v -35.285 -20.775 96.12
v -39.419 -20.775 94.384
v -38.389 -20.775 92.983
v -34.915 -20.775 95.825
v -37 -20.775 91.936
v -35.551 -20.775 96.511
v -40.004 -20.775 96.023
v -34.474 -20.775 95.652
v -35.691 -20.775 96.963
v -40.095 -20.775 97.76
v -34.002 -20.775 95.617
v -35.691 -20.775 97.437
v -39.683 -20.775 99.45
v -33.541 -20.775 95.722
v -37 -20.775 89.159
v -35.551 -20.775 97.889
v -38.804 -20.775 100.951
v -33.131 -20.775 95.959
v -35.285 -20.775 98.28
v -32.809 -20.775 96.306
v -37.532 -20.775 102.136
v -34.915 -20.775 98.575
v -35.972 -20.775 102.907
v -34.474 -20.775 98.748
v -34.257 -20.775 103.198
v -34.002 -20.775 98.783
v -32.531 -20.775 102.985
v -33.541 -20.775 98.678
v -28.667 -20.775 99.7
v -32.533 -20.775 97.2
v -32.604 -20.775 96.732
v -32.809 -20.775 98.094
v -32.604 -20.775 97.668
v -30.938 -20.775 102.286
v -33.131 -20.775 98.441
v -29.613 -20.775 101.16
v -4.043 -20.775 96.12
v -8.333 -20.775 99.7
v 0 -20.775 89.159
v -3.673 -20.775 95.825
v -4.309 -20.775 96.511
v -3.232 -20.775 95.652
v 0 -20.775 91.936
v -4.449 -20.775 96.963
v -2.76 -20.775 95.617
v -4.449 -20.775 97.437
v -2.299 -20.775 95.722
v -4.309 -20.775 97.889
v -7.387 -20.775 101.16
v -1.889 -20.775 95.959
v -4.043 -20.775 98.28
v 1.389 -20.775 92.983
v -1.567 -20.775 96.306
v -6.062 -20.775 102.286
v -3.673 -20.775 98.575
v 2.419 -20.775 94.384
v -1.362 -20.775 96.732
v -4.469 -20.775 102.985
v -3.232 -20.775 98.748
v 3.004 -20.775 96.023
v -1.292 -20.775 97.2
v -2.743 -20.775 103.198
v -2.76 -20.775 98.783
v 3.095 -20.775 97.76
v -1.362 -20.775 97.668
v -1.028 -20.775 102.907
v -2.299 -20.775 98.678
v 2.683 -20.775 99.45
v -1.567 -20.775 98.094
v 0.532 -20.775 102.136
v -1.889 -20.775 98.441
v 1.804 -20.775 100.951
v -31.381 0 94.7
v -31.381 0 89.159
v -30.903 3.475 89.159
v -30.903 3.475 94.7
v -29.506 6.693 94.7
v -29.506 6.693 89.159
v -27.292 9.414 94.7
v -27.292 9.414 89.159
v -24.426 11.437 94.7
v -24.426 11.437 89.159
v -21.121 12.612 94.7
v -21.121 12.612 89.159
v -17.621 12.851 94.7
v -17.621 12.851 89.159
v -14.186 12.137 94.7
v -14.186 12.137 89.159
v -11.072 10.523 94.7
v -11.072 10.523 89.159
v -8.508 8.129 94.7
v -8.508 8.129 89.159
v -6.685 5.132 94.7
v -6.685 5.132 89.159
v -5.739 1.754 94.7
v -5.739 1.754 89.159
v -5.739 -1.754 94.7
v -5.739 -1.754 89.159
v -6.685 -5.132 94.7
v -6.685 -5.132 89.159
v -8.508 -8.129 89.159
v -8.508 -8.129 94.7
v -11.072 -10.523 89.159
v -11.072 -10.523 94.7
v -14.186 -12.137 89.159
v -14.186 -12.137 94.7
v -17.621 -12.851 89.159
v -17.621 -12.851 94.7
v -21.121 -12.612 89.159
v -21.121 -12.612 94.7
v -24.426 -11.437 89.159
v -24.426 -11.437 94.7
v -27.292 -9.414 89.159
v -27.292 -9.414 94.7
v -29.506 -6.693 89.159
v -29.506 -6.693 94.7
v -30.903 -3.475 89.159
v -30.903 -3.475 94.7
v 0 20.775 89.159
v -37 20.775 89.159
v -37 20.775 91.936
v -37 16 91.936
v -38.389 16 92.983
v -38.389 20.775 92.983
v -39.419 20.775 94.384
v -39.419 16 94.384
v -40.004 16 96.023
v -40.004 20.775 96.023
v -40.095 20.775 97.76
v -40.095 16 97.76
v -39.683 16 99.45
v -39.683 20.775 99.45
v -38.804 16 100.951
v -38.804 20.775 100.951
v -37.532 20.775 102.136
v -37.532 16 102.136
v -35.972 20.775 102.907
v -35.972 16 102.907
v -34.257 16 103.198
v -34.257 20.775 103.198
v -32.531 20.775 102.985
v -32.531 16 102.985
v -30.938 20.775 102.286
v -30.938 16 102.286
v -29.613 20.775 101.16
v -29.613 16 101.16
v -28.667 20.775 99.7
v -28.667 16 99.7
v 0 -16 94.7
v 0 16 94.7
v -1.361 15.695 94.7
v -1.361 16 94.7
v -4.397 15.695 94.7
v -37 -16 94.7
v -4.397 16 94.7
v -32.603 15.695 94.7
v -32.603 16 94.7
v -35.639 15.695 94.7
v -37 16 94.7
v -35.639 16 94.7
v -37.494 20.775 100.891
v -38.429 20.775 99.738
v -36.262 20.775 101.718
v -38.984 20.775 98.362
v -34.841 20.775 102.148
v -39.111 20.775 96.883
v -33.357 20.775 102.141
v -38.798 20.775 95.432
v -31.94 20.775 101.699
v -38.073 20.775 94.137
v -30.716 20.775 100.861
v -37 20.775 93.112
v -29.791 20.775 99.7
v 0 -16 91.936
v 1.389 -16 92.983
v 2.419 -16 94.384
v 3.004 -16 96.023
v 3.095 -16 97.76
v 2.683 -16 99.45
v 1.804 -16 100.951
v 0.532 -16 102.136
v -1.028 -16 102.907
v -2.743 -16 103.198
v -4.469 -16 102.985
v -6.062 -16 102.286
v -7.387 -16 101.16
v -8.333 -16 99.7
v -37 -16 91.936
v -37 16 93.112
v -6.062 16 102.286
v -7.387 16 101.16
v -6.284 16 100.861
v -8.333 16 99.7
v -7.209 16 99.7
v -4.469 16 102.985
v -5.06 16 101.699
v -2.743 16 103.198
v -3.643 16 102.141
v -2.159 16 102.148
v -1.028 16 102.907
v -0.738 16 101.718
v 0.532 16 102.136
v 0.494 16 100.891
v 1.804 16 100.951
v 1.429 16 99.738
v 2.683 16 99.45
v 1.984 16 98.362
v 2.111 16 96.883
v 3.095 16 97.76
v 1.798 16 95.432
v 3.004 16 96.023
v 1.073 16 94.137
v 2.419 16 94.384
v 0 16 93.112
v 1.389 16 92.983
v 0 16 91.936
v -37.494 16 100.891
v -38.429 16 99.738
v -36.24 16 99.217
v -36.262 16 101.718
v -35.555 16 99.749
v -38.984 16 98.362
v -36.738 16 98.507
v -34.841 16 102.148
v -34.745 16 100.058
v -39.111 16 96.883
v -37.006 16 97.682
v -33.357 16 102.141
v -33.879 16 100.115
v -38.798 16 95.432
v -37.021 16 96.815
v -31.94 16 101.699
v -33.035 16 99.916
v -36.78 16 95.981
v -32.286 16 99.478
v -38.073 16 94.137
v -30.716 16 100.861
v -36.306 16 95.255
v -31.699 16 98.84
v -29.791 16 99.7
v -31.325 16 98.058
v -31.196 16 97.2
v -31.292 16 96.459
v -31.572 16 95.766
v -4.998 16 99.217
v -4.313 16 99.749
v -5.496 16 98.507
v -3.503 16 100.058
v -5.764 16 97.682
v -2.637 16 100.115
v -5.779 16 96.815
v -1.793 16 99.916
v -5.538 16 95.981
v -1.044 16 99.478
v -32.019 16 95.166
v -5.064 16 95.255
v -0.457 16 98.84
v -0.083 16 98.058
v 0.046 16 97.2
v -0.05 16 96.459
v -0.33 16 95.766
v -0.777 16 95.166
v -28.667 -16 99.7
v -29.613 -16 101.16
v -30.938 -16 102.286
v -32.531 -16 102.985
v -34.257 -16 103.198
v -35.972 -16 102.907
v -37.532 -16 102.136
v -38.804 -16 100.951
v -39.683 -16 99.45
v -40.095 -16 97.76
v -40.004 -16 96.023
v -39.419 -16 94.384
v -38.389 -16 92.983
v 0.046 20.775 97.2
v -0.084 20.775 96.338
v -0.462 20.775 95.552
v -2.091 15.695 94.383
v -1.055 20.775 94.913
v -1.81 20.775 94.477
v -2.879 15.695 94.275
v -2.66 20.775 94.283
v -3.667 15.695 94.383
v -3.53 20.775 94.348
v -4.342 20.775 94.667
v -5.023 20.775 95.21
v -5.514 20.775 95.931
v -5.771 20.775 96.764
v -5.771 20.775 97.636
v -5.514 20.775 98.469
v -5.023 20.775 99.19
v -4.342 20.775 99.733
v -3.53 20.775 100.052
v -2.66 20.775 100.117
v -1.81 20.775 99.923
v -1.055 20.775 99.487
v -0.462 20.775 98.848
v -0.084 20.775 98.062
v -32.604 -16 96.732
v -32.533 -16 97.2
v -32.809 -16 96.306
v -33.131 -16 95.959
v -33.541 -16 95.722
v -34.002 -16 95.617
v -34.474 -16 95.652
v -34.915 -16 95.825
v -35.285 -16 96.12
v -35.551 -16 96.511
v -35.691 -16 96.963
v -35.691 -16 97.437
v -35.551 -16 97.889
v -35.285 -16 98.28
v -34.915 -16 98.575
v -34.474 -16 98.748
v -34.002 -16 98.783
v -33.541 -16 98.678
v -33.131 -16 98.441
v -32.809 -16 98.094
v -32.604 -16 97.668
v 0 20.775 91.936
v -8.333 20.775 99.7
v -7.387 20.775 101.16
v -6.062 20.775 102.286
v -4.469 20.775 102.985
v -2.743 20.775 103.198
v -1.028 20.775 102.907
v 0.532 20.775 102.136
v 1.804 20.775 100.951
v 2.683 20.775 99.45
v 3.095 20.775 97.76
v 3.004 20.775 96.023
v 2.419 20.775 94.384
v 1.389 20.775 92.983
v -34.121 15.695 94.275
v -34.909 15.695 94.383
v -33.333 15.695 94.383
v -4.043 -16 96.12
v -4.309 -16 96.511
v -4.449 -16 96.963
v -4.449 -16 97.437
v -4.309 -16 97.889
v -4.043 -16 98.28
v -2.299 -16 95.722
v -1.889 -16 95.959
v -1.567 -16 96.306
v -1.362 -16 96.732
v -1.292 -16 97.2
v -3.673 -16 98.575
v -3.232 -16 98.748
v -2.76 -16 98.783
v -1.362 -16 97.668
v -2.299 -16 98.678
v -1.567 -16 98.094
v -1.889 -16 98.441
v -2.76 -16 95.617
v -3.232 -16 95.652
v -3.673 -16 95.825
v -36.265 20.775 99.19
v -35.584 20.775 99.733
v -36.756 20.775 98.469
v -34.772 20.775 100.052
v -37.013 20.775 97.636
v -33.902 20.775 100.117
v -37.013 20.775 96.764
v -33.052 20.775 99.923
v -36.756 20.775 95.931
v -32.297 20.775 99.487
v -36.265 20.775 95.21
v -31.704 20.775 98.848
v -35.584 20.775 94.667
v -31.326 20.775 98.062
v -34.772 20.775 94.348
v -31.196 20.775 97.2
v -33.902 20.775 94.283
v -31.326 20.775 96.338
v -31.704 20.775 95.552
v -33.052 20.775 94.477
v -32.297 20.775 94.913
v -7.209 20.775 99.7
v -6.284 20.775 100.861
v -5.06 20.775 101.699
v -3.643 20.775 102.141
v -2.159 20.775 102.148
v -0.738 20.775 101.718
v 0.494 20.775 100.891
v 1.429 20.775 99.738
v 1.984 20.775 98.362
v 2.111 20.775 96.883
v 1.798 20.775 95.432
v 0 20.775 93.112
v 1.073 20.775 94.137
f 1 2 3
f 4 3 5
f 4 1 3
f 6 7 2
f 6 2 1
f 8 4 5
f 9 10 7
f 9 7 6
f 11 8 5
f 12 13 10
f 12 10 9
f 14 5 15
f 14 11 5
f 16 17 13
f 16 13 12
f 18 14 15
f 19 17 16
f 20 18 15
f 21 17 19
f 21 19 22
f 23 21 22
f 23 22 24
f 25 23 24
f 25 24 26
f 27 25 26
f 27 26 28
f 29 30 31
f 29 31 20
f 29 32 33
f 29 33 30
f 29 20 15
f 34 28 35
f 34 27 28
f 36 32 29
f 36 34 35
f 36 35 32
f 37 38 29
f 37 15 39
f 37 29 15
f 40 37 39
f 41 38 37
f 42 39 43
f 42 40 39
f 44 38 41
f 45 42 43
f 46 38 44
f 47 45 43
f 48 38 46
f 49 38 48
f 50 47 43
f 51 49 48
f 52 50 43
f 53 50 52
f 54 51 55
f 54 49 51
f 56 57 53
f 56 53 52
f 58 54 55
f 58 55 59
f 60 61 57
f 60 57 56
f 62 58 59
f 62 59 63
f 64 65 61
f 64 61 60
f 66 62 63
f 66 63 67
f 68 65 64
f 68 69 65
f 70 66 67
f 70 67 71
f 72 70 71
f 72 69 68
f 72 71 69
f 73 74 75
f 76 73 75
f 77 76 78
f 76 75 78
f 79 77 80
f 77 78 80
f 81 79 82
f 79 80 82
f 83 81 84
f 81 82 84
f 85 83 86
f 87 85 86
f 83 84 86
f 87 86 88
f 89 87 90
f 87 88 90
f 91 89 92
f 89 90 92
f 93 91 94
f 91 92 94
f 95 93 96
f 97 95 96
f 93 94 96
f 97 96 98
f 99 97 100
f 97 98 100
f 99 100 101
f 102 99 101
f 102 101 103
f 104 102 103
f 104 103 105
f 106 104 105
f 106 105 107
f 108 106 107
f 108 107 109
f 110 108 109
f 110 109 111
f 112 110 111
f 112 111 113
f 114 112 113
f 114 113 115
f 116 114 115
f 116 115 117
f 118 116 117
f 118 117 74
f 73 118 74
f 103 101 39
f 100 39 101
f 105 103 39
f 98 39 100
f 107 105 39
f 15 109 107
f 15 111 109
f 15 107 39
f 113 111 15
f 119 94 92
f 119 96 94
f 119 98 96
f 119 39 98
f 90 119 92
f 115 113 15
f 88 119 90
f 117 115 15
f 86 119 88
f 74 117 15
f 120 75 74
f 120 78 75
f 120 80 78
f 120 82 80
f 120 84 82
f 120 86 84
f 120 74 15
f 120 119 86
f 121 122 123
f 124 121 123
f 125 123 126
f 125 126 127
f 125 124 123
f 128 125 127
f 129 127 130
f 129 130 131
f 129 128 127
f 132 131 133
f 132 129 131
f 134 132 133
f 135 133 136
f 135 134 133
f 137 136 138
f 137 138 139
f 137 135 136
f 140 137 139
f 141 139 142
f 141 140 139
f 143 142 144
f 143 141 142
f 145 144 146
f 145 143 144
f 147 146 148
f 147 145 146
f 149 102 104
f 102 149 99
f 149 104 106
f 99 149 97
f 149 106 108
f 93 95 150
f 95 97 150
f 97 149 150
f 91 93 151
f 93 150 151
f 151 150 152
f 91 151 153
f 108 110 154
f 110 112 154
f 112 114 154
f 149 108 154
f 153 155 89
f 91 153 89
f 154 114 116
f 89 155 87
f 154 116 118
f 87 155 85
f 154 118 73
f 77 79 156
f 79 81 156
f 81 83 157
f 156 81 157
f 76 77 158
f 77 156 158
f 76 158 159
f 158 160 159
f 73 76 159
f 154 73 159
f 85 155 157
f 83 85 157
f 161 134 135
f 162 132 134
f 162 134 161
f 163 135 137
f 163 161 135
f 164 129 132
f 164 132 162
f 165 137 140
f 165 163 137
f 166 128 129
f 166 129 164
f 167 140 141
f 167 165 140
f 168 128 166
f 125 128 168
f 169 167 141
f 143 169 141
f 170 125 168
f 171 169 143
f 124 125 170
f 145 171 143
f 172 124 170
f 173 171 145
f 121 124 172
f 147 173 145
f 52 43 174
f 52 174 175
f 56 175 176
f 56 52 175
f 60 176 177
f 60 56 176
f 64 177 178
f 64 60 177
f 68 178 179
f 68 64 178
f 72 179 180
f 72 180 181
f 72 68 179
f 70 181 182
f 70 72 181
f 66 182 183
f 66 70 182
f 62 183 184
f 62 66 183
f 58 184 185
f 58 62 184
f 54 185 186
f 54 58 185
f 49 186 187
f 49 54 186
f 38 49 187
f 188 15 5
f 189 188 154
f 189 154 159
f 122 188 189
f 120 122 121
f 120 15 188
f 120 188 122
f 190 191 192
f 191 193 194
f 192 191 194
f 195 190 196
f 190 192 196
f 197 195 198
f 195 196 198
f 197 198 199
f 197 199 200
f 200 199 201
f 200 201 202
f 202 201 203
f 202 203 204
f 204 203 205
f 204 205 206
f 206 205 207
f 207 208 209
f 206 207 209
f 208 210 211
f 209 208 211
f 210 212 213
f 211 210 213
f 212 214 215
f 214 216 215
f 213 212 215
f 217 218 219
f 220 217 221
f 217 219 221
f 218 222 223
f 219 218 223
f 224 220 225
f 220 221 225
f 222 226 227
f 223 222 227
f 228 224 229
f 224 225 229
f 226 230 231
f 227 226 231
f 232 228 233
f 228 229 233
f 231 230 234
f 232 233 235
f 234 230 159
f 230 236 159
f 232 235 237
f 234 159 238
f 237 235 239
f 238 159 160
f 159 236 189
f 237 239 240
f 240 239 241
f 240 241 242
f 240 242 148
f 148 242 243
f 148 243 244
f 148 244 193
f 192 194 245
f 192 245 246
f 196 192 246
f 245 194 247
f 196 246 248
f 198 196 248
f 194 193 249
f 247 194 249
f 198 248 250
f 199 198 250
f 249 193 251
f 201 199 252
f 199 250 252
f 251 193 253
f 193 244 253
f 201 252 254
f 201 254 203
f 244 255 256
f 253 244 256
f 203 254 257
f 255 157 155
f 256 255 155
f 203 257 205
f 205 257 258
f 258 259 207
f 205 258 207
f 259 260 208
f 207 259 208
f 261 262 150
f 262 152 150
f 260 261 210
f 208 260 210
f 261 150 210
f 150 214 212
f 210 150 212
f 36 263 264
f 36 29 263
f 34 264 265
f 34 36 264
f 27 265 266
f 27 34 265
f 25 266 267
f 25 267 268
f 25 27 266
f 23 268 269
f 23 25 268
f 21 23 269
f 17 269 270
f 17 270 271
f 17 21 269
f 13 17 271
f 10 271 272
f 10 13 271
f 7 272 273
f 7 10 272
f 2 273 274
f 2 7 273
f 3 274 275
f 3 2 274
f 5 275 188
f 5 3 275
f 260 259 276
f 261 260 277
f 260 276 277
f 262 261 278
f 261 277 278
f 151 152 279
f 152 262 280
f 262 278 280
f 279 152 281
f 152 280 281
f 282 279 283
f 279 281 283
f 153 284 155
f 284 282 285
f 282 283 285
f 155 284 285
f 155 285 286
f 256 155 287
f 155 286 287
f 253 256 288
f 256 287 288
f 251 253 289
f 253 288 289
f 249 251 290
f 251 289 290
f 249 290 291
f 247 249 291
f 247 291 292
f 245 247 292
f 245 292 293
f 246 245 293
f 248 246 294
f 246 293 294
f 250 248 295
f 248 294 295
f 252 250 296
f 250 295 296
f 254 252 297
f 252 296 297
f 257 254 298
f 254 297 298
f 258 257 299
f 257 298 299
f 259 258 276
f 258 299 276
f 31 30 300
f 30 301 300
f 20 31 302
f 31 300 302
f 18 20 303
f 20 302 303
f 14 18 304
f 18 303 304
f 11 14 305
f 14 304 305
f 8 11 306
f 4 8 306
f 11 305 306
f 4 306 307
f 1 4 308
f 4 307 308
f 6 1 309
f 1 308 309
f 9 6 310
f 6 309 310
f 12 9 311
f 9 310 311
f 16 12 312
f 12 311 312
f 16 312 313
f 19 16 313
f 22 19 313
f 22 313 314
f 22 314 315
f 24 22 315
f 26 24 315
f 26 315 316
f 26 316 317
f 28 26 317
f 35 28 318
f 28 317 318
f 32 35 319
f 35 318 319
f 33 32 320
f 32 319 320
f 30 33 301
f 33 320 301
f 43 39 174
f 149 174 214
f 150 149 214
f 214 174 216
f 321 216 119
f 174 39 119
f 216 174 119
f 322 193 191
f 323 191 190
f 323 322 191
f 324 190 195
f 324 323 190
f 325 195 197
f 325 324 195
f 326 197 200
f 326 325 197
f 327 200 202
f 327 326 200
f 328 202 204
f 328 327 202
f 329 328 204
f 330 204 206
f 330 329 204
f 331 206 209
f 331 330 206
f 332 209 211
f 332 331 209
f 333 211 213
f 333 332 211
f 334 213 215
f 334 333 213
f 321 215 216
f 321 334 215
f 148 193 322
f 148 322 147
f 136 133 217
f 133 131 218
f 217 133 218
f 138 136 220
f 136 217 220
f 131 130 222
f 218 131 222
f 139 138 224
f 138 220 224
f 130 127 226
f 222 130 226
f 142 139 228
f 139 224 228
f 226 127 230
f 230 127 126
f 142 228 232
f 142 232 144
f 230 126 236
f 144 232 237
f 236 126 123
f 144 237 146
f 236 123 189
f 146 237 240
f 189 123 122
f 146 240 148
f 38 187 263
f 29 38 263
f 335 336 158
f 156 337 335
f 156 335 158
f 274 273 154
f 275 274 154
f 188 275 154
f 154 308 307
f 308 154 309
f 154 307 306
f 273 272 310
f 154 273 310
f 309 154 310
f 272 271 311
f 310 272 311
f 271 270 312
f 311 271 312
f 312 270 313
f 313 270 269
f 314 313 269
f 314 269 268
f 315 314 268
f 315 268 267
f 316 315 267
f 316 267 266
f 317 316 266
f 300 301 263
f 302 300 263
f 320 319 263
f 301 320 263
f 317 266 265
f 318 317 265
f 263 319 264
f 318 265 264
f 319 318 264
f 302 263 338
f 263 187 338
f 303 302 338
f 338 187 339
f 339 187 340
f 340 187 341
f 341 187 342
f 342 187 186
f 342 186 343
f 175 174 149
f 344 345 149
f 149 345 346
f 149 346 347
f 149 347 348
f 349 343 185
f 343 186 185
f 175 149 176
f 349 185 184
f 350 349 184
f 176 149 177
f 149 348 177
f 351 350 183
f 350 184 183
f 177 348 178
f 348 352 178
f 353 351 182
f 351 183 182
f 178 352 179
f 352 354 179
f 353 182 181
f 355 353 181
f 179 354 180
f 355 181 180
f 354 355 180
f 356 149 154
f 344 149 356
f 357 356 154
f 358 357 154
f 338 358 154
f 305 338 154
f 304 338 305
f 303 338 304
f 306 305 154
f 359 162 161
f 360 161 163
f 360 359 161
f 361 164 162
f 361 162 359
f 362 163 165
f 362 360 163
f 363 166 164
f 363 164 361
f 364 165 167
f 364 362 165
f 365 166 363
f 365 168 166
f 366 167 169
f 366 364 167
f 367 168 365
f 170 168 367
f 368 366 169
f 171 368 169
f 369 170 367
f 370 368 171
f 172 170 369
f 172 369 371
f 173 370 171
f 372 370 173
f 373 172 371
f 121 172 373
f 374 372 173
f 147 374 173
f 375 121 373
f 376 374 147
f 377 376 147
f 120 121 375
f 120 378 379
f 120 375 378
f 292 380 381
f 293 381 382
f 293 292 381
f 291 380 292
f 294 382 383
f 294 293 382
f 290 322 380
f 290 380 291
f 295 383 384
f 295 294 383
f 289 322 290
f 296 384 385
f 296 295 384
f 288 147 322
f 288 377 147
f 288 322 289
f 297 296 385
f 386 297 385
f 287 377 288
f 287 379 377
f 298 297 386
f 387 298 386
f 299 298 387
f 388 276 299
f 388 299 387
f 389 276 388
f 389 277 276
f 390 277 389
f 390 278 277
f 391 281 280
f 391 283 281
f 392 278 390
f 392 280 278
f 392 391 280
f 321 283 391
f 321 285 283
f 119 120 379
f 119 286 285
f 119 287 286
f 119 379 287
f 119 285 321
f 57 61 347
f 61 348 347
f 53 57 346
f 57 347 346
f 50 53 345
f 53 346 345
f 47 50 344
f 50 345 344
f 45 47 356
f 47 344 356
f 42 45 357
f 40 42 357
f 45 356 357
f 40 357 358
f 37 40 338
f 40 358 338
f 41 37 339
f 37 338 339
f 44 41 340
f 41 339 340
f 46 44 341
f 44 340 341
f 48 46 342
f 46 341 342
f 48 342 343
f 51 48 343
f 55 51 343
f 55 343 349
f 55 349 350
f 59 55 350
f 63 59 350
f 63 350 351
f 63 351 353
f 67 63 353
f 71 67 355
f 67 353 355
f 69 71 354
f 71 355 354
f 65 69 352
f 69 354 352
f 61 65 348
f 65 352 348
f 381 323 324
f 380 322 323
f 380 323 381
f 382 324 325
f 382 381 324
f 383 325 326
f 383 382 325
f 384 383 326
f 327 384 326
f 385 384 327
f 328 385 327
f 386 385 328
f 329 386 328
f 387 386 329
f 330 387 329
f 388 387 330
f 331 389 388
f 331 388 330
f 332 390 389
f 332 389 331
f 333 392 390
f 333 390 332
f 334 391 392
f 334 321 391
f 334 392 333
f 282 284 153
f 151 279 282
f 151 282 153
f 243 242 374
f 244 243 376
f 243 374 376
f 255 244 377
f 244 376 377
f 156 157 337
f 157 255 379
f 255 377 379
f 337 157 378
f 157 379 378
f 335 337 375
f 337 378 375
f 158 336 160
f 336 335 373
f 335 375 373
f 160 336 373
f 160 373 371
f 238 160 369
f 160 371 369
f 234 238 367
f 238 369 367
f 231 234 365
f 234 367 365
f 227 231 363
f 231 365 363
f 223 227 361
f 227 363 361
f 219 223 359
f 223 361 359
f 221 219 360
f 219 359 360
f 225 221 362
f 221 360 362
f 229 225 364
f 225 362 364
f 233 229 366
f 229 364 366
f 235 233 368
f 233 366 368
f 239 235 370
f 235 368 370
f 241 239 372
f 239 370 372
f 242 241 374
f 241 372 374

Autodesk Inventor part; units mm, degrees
ref_plane "YZ Plane" through (0, 0, 0) normal (1, 0, 0) x (0, 1, 0)
ref_plane "XZ Plane" through (0, 0, 0) normal (0, 1, 0) x (-1, 0, 0)
ref_plane "XY Plane" through (0, 0, 0) normal (0, 0, 1) x (1, 0, 0)
sketch "Sketch2" plane through (0, 0, 0) normal (1, 0, 0) x (0, 1, 0)
  circle A0 centre (0, 0) radius 12.881
  line L0 (-16, -18.5) -> (16, -18.5)
  line L1 (16, -18.5) -> (16, 18.5)
  line L2 (16, 18.5) -> (-16, 18.5)
  line L3 (-16, 18.5) -> (-16, -18.5)
  line L4 (-16, -18.5) -> (16, 18.5) construction
  line L5 (16, -18.5) -> (-16, 18.5) construction
  dimension "d9" = 25.762
  dimension "d10" = 32
  dimension "d11" = 37
extrude "Extrusion2" add sketch "Sketch2" along normal blind 76.2
sketch "Sketch3" plane through (0, -16, -18.5) normal (0, 0, -1) x (-1, 0, 0)
  line L0 (0, 0) -> (0, 32) projected
  circle A0 centre (18.5, 16) radius 12.881
  line L1 (0, 32) -> (0, 0)
  line L2 (0, 0) -> (37, 0)
  line L3 (37, 0) -> (37, 32)
  line L4 (37, 32) -> (0, 32)
  line L5 (0, 32) -> (37, 0) construction
  line L6 (0, 0) -> (37, 32) construction
  point P0 (0, 16)
  dimension "d14" = 25.762
  dimension "d15" = 32
  dimension "d16" = 37
extrude "Extrusion3" add sketch "Sketch3" against normal blind 113.2
sketch "Sketch4" plane through (76.2, -16, -18.5) normal (0, 0, -1) x (-1, 0, 0)
  circle A0 centre (94.7, 16) radius 12.881 projected
  point P0 (76.2, 16)
extrude "Extrusion4" add sketch "Sketch4" against normal blind 37
sketch "Sketch5" plane through (76.2, 16, 18.5) normal (0, 1, 0) x (1, 0, 0)
  line L0 (-113.2, 37) -> (0, 37) projected
  line L1 (-113.2, 37) -> (-113.2, -76.2) projected
  line L2 (-113.2, 37) -> (-100.1185, 50.0815)
  line L3 (-113.2, 37) -> (-94.7, 37) construction
  line L4 (-113.2, 37) -> (-126.2815, 23.9185)
  line L5 (-113.2, 37) -> (-94.7, 37) construction
  line L6 (-100.1185, 50.0815) -> (-154.0001, 103.963)
  line L7 (-126.2815, 23.9185) -> (-180.163, 77.8001)
  line L8 (-126.2815, 23.9185) -> (-50.0815, 23.9185) construction
  line L9 (-154.0001, 103.963) -> (-180.163, 77.8001)
  line L10 (-100.1185, 50.0815) -> (-87.037, 37)
  line L11 (-126.2815, 23.9185) -> (-113.2, 10.837)
  point P0 (-76.2, 18.5)
  dimension "d21" = 18.5
  dimension "d22" = 45
  dimension "d23" = 18.5
  dimension "d24" = 135
  dimension "d25" = 76.2
  dimension "d26" = 76.2
  dimension "d27" = 135
extrude "Extrusion5" add sketch "Sketch5" against normal blind 32
sketch "Sketch7" plane through (-77.8001, -16, -85.463) normal (-0.7071068, 0, -0.7071068) x (-0.7071068, 0, 0.7071068)
  line L0 (36.4256, 0.4968) -> (36.4256, 31.5032)
  line L1 (36.4256, 31.5032) -> (0.5744, 31.5032)
  line L2 (0.5744, 31.5032) -> (0.5744, 0.4968)
  line L3 (0.5744, 0.4968) -> (36.4256, 0.4968)
  circle A0 centre (18.5, 16) radius 12.881
  point P0 (5.4185, 16)
  point P1 (36.4256, 16)
  dimension "d131" = 25.762
extrude "Extrusion6" cut sketch "Sketch7" against normal blind 101.6 contours A0
sketch "Sketch8" plane through (76.2, 16, 18.5) normal (0, 1, 0) x (1, 0, 0)
  line L0 (-76.2, 0) -> (0, 0) projected
  line L1 (-87.037, 37) -> (0, 37) projected
  line L2 (-87.037, 37) -> (-154.0001, 103.963) projected
  line L3 (-180.163, 77.8001) -> (-113.2, 10.837) projected
  line L4 (-113.2, 10.837) -> (-113.2, -76.2) projected
  line L5 (-76.2, 0) -> (-76.2, -76.2) projected
  line L6 (0, 37) -> (5, 37)
  line L7 (5, 37) -> (5, 0)
  line L8 (5, 0) -> (0, 0)
  line L9 (0, 0) -> (0, 37)
  line L10 (-113.2, -76.2) -> (-76.2, -76.2)
  line L11 (-76.2, -76.2) -> (-76.2, -81.2)
  line L12 (-76.2, -81.2) -> (-113.2, -81.2)
  line L13 (-113.2, -81.2) -> (-113.2, -76.2)
  line L14 (-180.163, 77.8001) -> (-183.6985, 81.3356)
  line L15 (-183.6985, 81.3356) -> (-157.5356, 107.4985)
  line L16 (-157.5356, 107.4985) -> (-154.0001, 103.963)
  point P0 (-76.2, 18.5)
  dimension "d32" = 5
  dimension "d33" = 5
  dimension "d34" = 5
  dimension "d35" = 90
extrude "Extrusion7" add sketch "Sketch8" along normal blind 4.7752
sketch "Sketch9" plane through (76.2, -16, -18.5) normal (0, -1, 0) x (1, 0, 0)
  line L0 (-87.037, 0) -> (0, 0) projected
  line L1 (-76.2, 37) -> (0, 37) projected
  line L2 (-76.2, 37) -> (-76.2, 113.2) projected
  line L3 (-113.2, 26.163) -> (-113.2, 113.2) projected
  line L4 (-113.2, 26.163) -> (-180.163, -40.8001) projected
  line L5 (-154.0001, -66.963) -> (-87.037, 0) projected
  line L6 (-76.2, 118.2) -> (-76.2, 37) projected
  line L7 (-113.2, 113.2) -> (-76.2, 113.2)
  line L8 (-76.2, 113.2) -> (-76.2, 118.2)
  line L9 (-76.2, 118.2) -> (-113.2, 118.2)
  line L10 (-113.2, 118.2) -> (-113.2, 113.2)
  line L11 (-76.2, 37) -> (5, 37) projected
  line L12 (0, 0) -> (5, 0)
  line L13 (5, 0) -> (5, 37)
  line L14 (5, 37) -> (0, 37)
  line L15 (0, 37) -> (0, 0)
  line L16 (-183.6985, -44.3356) -> (-113.2, 26.163) projected
  line L17 (-180.163, -40.8001) -> (-183.6985, -44.3356)
  line L18 (-183.6985, -44.3356) -> (-157.5356, -70.4985)
  line L19 (-157.5356, -70.4985) -> (-154.0001, -66.963)
  point P0 (-76.2, 18.5)
extrude "Extrusion8" add sketch "Sketch9" along normal blind 4.7752
sketch "Sketch10" plane through (76.2, 20.7752, 18.5) normal (0, 1, 0) x (1, 0, 0)
  circle A0 centre (2.5, 34.4385) radius 1.5875
  circle A1 centre (2.5, 2.5615) radius 1.5875
  line L0 (0, 37.0615) -> (0, 0.0615)
  line L1 (0, 0.0615) -> (5, 0.0615)
  line L2 (5, 37.0615) -> (5, 0.0615)
  line L3 (0, 37.0615) -> (5, 37.0615)
  line L4 (5, 0) -> (5, 37) projected
  line L5 (0, 18.5) -> (5, 18.5)
  point P0 (-76.2, 18.5)
  dimension "d143" = 15.9385
  dimension "d144" = 2.5
  dimension "d145" = 2.5
  dimension "d146" = 15.9385
extrude "Extrusion9" cut sketch "Sketch10" against normal blind 279.4 contours A0 | A1
sketch "Sketch11" plane through (76.2, 20.7752, 18.5) normal (0, 1, 0) x (1, 0, 0)
  circle A0 centre (-79.079, -78.7) radius 1.5875
  circle A1 centre (-110.321, -78.7) radius 1.5875
  line L0 (-76.579, -76.2) -> (-113.579, -76.2)
  line L1 (-113.579, -76.2) -> (-113.579, -81.2)
  line L2 (-76.579, -81.2) -> (-113.579, -81.2)
  line L3 (-76.579, -76.2) -> (-76.579, -81.2)
  circle A2 centre (-157.6226, 103.876) radius 1.778
  circle A3 centre (-180.163, 81.3356) radius 1.778
  line L4 (-157.5791, 107.4551) -> (-183.742, 81.2921)
  line L5 (-183.742, 81.2921) -> (-180.2065, 77.7566)
  line L6 (-154.0435, 103.9195) -> (-180.2065, 77.7566)
  line L7 (-157.5791, 107.4551) -> (-154.0435, 103.9195)
  line L8 (-157.5356, 107.4985) -> (-183.6985, 81.3356) projected
  line L9 (-170.6606, 94.3736) -> (-167.125, 90.838)
  line L10 (-113.2, -81.2) -> (-76.2, -81.2) projected
  line L11 (-94.7, -76.2) -> (-94.7, -81.2)
  point P0 (-76.2, 18.5)
  dimension "d147" = 2.5
  dimension "d148" = 2.5
  dimension "d149" = 15.9385
  dimension "d150" = 15.9385
  dimension "d151" = 2.5
  dimension "d152" = 2.5
  dimension "d153" = 15.621
  dimension "d154" = 15.621
  dimension "d175" = 3.556
  dimension "d176" = 3.556
extrude "Extrusion10" cut sketch "Sketch11" against normal blind 279.4 contours A0 | A1 | A2 | A3
fillet "Fillet1" radius 3.175 3 edges at (-10.837, 0, -18.5) (0, 0, 18.5) (-37, 0, 7.663)
sketch "Sketch13" plane through (76.2, 20.7752, 18.5) normal (0, 1, 0) x (1, 0, 0)
  line L0 (-157.5356, 107.4985) -> (-183.6985, 81.3356) projected
  line L1 (-113.2, -81.2) -> (-76.2, -81.2) projected
  line L2 (5, 0) -> (5, 37) projected
  line L3 (5, 37) -> (5, 0) projected
  line L4 (5, 18.5) -> (-120.863, 18.5)
  line L5 (-114.1299, 11.767) -> (-183.6985, 81.3356) projected
  line L6 (-76.2, -81.2) -> (-113.2, -81.2) projected
  line L7 (-94.7, -81.2) -> (-95.2395, 19.0395)
  line L8 (-104.3477, 9.9312) -> (-86.1312, 28.1477) projected
  line L9 (-95.2395, 19.0395) -> (-170.6171, 94.4171)
  line L10 (-183.6985, 81.3356) -> (-157.5356, 107.4985) projected
  circle A0 centre (-14.05, 18.5) radius 6.35
  circle A1 centre (-39.45, 18.5) radius 6.35
  circle A2 centre (-64.85, 18.5) radius 6.35
  circle A3 centre (-90.25, 18.5) radius 6.35
  circle A4 centre (-94.8025, -62.15) radius 6.35
  circle A5 centre (-94.9392, -36.7504) radius 6.35
  circle A6 centre (-95.0759, -11.3507) radius 6.35
  circle A7 centre (-95.2126, 14.0489) radius 6.35
  circle A8 centre (-157.1467, 80.9467) radius 6.35
  circle A9 centre (-139.1862, 62.9862) radius 6.35
  circle A10 centre (-121.2257, 45.0257) radius 6.35
  circle A11 centre (-103.2651, 27.0651) radius 6.35
  point P0 (-76.2, 18.5)
  point P1 (-95.1101, -5.0008)
  point P2 (-95.0418, -17.7006)
  point P3 (-94.9734, -30.4005)
  point P4 (-94.9051, -43.1003)
  dimension "d60" = 12.7
  dimension "d61" = 19.05
  dimension "d64" = 25.4
  dimension "d69" = 12.7
  dimension "d70" = 19.05
  dimension "d73" = 25.4
  dimension "d78" = 12.7
  dimension "d79" = 19.05
  dimension "d82" = 25.4
extrude "Extrusion12" cut sketch "Sketch13" against normal blind 127 contours A8 L9 | L9 A8 | A9 L9 | L9 A9 | A11 L9 | L9 A11 | A10 L9 | L9 A10 | A0 L4 | L4 A0 | A1 L4 | L4 A1 | A2 L4 | L4 A2 | A4 L7 | L7 A4 | A5 L7 | L7 A5 | A6 L7 | L7 A6
sketch "Sketch14" plane through (81.2, 16, -18.5) normal (0, 0, -1) x (-1, 0, 0)
  line L0 (0, 4.7752) -> (90.7219, 4.7752) projected
  line L1 (0, 0) -> (0, 4.7752) projected
  circle A0 centre (19.05, -16) radius 6.35
  circle A1 centre (44.45, -16) radius 6.35
  circle A2 centre (69.85, -16) radius 6.35
  point P0 (81.2, -16)
  dimension "d89" = 12.7
  dimension "d91" = 19.05
  dimension "d94" = 25.4
extrude "Extrusion13" cut sketch "Sketch14" against normal blind 50.8
sketch "Sketch15" plane through (-37, 16, 94.7) normal (-1, 0, 0) x (0, 0, 1)
  line L0 (5, 0) -> (5, 4.7752) projected
  line L1 (-85.7219, 4.7752) -> (5, 4.7752) projected
  circle A0 centre (-14.05, -16) radius 6.35
  circle A1 centre (-39.45, -16) radius 6.35
  circle A2 centre (-64.85, -16) radius 6.35
  point P0 (-94.7, -16)
  dimension "d101" = 12.7
  dimension "d102" = 19.05
  dimension "d105" = 25.4
extrude "Extrusion14" cut sketch "Sketch15" against normal blind 50.8
sketch "Sketch16" plane through (-107.4985, 16, -62.8356) normal (-0.7071068, 0, 0.7071068) x (0.7071068, 0, 0.7071068)
  line L0 (0, 4.7752) -> (98.3849, 4.7752) projected
  line L1 (0, 0) -> (0, 4.7752) projected
  circle A0 centre (19.05, -16) radius 6.35
  circle A1 centre (44.45, -16) radius 6.35
  circle A2 centre (69.85, -16) radius 6.35
  point P0 (120.4444, -16)
  dimension "d112" = 12.7
  dimension "d113" = 19.05
  dimension "d116" = 25.4
extrude "Extrusion15" cut sketch "Sketch16" against normal blind 101.6
sketch "Sketch19" plane through (76.2, 20.7752, 18.5) normal (0, 1, 0) x (1, 0, 0)
  circle A0 centre (-157.6226, 103.876) radius 1.778 projected
  circle A1 centre (-79.079, -78.7) radius 1.5875 projected
  circle A2 centre (-180.163, 81.3356) radius 1.778 projected
  circle A3 centre (-110.321, -78.7) radius 1.5875 projected
  circle A4 centre (2.5, 2.5615) radius 1.5875 projected
  circle A5 centre (2.5, 34.4385) radius 1.5875 projected
  line L0 (-87.967, 37.9299) -> (-157.5356, 107.4985) projected
  line L1 (-157.5356, 107.4985) -> (-183.6985, 81.3356) projected
  line L2 (-183.6985, 81.3356) -> (-114.1299, 11.767) projected
  line L3 (-113.2, 9.5219) -> (-113.2, -81.2) projected
  line L4 (-113.2, -81.2) -> (-76.2, -81.2) projected
  line L5 (-76.2, -81.2) -> (-76.2, -3.175) projected
  line L6 (-73.025, 0) -> (5, 0) projected
  line L7 (5, 0) -> (5, 37) projected
  line L8 (5, 37) -> (-85.7219, 37) projected
  circle A6 centre (2.5, 2.5615) radius 5
  circle A7 centre (2.5, 34.4385) radius 5
  circle A8 centre (-110.321, -78.7) radius 5
  circle A9 centre (-79.079, -78.7) radius 5
  circle A10 centre (-180.163, 81.3356) radius 5
  circle A11 centre (-157.6226, 103.876) radius 5
  point P0 (-76.2, 18.5)
  point P1 (-76.2, -74.612)
  point P2 (-83.4091, -81.2)
  point P3 (-113.2, -74.612)
  point P4 (-105.9909, -81.2)
  point P5 (-178.8689, 86.1652)
  point P6 (-178.8689, 76.506)
  point P7 (-152.7579, 102.7208)
  point P8 (-162.4522, 102.5819)
  point P9 (5, 6.8916)
  point P10 (-1.794, 0)
  point P11 (-1.794, 37)
  point P12 (5, 30.1084)
  dimension "d132" = 10
  dimension "d133" = 10
  dimension "d134" = 10
  dimension "d135" = 10
  dimension "d136" = 10
  dimension "d137" = 10
extrude "Extrusion17" add sketch "Sketch19" against normal blind 4.7752 contours L0 L1 A11 | L1 L2 A10 | L3 L4 A8 | L4 L5 A9 | L6 L7 A6 | L7 L8 A7 picked at (-160.8698, 104.621) picked at (-180.881, 84.6119) picked at (-108.6315, -81.5172) picked at (-80.7689, -81.5168) picked at (0.7108, -0.3118) picked at (0.7108, 37.3118)
sketch "Sketch20" plane through (76.2, -20.7752, -18.5) normal (0, -1, 0) x (1, 0, 0)
  circle A0 centre (-157.6226, -66.876) radius 1.778 projected
  circle A1 centre (-180.163, -44.3356) radius 1.778 projected
  circle A2 centre (2.5, 34.4385) radius 1.5875 projected
  circle A3 centre (2.5, 2.5615) radius 1.5875 projected
  line L0 (-157.5356, -70.4985) -> (-87.967, -0.9299) projected
  line L1 (-85.7219, 0) -> (5, 0) projected
  line L2 (5, 0) -> (5, 37) projected
  line L3 (5, 37) -> (-73.025, 37) projected
  line L4 (-76.2, 40.175) -> (-76.2, 118.2) projected
  line L5 (-76.2, 118.2) -> (-113.2, 118.2) projected
  line L6 (-113.2, 118.2) -> (-113.2, 27.4781) projected
  line L7 (-114.1299, 25.233) -> (-183.6985, -44.3356) projected
  line L8 (-183.6985, -44.3356) -> (-157.5356, -70.4985) projected
  circle A4 centre (-157.6226, -66.876) radius 5
  circle A5 centre (-180.163, -44.3356) radius 5
  circle A6 centre (-110.321, 115.7) radius 1.5875 projected
  circle A7 centre (-110.321, 115.7) radius 6
  circle A8 centre (-79.079, 115.7) radius 1.5875 projected
  circle A9 centre (-79.079, 115.7) radius 6
  circle A10 centre (2.5, 34.4385) radius 5
  circle A11 centre (2.5, 2.5615) radius 5
  point P0 (-76.2, 18.5)
  point P1 (5, 6.8916)
  point P2 (-1.794, 0)
  point P3 (-1.794, 37)
  point P4 (5, 30.1084)
  point P5 (-84.5334, 118.2)
  point P6 (-76.2, 110.4358)
  point P7 (-104.8666, 118.2)
  point P8 (-113.2, 110.4358)
  point P9 (-162.4522, -65.5819)
  point P10 (-152.7579, -65.7208)
  point P11 (-178.8689, -39.506)
  point P12 (-178.8689, -49.1652)
  dimension "d173" = 12
  dimension "d174" = 12
extrude "Extrusion18" add sketch "Sketch20" against normal blind 4.7752 contours L0 A4 L8 | L1 L2 A11 | L2 L3 A10 | L4 L5 A9 | L5 L6 A7 | L7 L8 A5 picked at (-160.8698, -67.621) picked at (0.7108, -0.3118) picked at (0.7108, 37.3118) picked at (-81.4972, 118.6185) picked at (-107.8901, 118.6026) picked at (-180.881, -47.6119)
sketch "Sketch21" plane through (76.2, 20.7752, 18.5) normal (0, 1, 0) x (1, 0, 0)
  circle A0 centre (-79.079, -78.7) radius 1.5875 projected
  circle A1 centre (-110.321, -78.7) radius 1.5875 projected
  circle A2 centre (2.5, 2.5615) radius 1.5875 projected
  circle A3 centre (2.5, 34.4385) radius 1.5875 projected
  arc A4 (-152.7579, 102.7208) -> (-162.4522, 102.5819) centre (-157.6226, 103.876) ccw projected
  arc A5 (-178.8689, 86.1652) -> (-178.8689, 76.506) centre (-180.163, 81.3356) ccw projected
  arc A6 (-113.2, -74.612) -> (-105.9909, -81.2) centre (-110.321, -78.7) ccw projected
  circle A7 centre (-110.321, -78.7) radius 2.8
  circle A8 centre (-79.079, -78.7) radius 1.5875 projected
  circle A9 centre (-79.079, -78.7) radius 2.8
  circle A10 centre (2.5, 34.4385) radius 1.5875 projected
  circle A11 centre (2.5, 34.4385) radius 2.8
  circle A12 centre (2.5, 2.5615) radius 1.5875 projected
  circle A13 centre (2.5, 2.5615) radius 2.8
  circle A14 centre (-157.6226, 103.876) radius 2.8
  circle A15 centre (-180.163, 81.3356) radius 2.8
  point P0 (-76.2, 18.5)
  dimension "d155" = 5.6
  dimension "d156" = 5.6
  dimension "d157" = 5.6
  dimension "d158" = 5.6
  dimension "d159" = 5.6
  dimension "d160" = 5.6
extrude "Extrusion19" cut sketch "Sketch21" against normal blind 4.7752
sketch "Sketch22" plane through (76.2, 20.7752, 18.5) normal (0, 1, 0) x (1, 0, 0)
  circle A0 centre (-103.2651, 27.0651) radius 6.35 projected
  circle A1 centre (-14.05, 18.5) radius 6.35 projected
  circle A2 centre (-94.8025, -62.15) radius 6.35 projected
  circle A3 centre (-157.1467, 80.9467) radius 6.35 projected
  circle A4 centre (-95.0759, -11.3507) radius 6.35 projected
  circle A5 centre (-121.2257, 45.0257) radius 6.35 projected
  circle A6 centre (-39.45, 18.5) radius 6.35 projected
  circle A7 centre (-64.85, 18.5) radius 6.35 projected
  circle A8 centre (-139.1862, 62.9862) radius 6.35 projected
  circle A9 centre (-94.9392, -36.7504) radius 6.35 projected
  line L0 (-192.0238, 124.49) -> (10.7889, 124.49)
  line L1 (10.7889, 124.49) -> (10.7889, -70.6592)
  line L2 (10.7889, -70.6592) -> (-192.0238, -70.6592)
  line L3 (-192.0238, -70.6592) -> (-192.0238, 124.49)
  point P0 (-76.2, 18.5)
extrude "Extrusion20" cut sketch "Sketch22" against normal blind 50.8
sketch "Sketch23" plane through (76.2, 20.7752, 18.5) normal (0, 1, 0) x (1, 0, 0)
  circle A0 centre (-110.321, -78.7) radius 2.8 projected
  circle A1 centre (-79.079, -78.7) radius 2.8 projected
  circle A2 centre (-110.321, -78.7) radius 2.925
  circle A3 centre (-79.079, -78.7) radius 2.925
  point P0 (-76.2, 18.5)
  dimension "d165" = 5.85
  dimension "d166" = 5.85
extrude "Extrusion21" cut sketch "Sketch23" against normal blind 5.08 contours A0 | A1 | A2 | A3
sketch "Sketch24" plane through (76.2, 20.7752, 18.5) normal (0, 1, 0) x (1, 0, 0)
  line L0 (-113.2, -70.6592) -> (-113.2, -74.612) projected
  arc A0 (-113.2, -74.612) -> (-105.9909, -81.2) centre (-110.321, -78.7) ccw projected
  line L1 (-105.9909, -81.2) -> (-83.4091, -81.2) projected
  arc A1 (-83.4091, -81.2) -> (-76.2, -74.612) centre (-79.079, -78.7) ccw projected
  line L2 (-76.2, -74.612) -> (-76.2, -70.6592) projected
  circle A2 centre (-110.321, -78.7) radius 6
  circle A3 centre (-79.079, -78.7) radius 6
  point P0 (-76.2, 18.5)
  point P1 (-84.5334, -81.2)
  point P2 (-76.2, -73.4358)
  point P3 (-113.2, -73.4358)
  point P4 (-104.8666, -81.2)
  dimension "d169" = 12
  dimension "d170" = 12
extrude "Extrusion22" add sketch "Sketch24" against normal blind 4.7752 contours L0 A0 L1 A2 | L1 A1 L2 A3 picked at (-105.4871, -81.6026) picked at (-73.5184, -79.5754)
properties part number "testPrintBracketV3"
